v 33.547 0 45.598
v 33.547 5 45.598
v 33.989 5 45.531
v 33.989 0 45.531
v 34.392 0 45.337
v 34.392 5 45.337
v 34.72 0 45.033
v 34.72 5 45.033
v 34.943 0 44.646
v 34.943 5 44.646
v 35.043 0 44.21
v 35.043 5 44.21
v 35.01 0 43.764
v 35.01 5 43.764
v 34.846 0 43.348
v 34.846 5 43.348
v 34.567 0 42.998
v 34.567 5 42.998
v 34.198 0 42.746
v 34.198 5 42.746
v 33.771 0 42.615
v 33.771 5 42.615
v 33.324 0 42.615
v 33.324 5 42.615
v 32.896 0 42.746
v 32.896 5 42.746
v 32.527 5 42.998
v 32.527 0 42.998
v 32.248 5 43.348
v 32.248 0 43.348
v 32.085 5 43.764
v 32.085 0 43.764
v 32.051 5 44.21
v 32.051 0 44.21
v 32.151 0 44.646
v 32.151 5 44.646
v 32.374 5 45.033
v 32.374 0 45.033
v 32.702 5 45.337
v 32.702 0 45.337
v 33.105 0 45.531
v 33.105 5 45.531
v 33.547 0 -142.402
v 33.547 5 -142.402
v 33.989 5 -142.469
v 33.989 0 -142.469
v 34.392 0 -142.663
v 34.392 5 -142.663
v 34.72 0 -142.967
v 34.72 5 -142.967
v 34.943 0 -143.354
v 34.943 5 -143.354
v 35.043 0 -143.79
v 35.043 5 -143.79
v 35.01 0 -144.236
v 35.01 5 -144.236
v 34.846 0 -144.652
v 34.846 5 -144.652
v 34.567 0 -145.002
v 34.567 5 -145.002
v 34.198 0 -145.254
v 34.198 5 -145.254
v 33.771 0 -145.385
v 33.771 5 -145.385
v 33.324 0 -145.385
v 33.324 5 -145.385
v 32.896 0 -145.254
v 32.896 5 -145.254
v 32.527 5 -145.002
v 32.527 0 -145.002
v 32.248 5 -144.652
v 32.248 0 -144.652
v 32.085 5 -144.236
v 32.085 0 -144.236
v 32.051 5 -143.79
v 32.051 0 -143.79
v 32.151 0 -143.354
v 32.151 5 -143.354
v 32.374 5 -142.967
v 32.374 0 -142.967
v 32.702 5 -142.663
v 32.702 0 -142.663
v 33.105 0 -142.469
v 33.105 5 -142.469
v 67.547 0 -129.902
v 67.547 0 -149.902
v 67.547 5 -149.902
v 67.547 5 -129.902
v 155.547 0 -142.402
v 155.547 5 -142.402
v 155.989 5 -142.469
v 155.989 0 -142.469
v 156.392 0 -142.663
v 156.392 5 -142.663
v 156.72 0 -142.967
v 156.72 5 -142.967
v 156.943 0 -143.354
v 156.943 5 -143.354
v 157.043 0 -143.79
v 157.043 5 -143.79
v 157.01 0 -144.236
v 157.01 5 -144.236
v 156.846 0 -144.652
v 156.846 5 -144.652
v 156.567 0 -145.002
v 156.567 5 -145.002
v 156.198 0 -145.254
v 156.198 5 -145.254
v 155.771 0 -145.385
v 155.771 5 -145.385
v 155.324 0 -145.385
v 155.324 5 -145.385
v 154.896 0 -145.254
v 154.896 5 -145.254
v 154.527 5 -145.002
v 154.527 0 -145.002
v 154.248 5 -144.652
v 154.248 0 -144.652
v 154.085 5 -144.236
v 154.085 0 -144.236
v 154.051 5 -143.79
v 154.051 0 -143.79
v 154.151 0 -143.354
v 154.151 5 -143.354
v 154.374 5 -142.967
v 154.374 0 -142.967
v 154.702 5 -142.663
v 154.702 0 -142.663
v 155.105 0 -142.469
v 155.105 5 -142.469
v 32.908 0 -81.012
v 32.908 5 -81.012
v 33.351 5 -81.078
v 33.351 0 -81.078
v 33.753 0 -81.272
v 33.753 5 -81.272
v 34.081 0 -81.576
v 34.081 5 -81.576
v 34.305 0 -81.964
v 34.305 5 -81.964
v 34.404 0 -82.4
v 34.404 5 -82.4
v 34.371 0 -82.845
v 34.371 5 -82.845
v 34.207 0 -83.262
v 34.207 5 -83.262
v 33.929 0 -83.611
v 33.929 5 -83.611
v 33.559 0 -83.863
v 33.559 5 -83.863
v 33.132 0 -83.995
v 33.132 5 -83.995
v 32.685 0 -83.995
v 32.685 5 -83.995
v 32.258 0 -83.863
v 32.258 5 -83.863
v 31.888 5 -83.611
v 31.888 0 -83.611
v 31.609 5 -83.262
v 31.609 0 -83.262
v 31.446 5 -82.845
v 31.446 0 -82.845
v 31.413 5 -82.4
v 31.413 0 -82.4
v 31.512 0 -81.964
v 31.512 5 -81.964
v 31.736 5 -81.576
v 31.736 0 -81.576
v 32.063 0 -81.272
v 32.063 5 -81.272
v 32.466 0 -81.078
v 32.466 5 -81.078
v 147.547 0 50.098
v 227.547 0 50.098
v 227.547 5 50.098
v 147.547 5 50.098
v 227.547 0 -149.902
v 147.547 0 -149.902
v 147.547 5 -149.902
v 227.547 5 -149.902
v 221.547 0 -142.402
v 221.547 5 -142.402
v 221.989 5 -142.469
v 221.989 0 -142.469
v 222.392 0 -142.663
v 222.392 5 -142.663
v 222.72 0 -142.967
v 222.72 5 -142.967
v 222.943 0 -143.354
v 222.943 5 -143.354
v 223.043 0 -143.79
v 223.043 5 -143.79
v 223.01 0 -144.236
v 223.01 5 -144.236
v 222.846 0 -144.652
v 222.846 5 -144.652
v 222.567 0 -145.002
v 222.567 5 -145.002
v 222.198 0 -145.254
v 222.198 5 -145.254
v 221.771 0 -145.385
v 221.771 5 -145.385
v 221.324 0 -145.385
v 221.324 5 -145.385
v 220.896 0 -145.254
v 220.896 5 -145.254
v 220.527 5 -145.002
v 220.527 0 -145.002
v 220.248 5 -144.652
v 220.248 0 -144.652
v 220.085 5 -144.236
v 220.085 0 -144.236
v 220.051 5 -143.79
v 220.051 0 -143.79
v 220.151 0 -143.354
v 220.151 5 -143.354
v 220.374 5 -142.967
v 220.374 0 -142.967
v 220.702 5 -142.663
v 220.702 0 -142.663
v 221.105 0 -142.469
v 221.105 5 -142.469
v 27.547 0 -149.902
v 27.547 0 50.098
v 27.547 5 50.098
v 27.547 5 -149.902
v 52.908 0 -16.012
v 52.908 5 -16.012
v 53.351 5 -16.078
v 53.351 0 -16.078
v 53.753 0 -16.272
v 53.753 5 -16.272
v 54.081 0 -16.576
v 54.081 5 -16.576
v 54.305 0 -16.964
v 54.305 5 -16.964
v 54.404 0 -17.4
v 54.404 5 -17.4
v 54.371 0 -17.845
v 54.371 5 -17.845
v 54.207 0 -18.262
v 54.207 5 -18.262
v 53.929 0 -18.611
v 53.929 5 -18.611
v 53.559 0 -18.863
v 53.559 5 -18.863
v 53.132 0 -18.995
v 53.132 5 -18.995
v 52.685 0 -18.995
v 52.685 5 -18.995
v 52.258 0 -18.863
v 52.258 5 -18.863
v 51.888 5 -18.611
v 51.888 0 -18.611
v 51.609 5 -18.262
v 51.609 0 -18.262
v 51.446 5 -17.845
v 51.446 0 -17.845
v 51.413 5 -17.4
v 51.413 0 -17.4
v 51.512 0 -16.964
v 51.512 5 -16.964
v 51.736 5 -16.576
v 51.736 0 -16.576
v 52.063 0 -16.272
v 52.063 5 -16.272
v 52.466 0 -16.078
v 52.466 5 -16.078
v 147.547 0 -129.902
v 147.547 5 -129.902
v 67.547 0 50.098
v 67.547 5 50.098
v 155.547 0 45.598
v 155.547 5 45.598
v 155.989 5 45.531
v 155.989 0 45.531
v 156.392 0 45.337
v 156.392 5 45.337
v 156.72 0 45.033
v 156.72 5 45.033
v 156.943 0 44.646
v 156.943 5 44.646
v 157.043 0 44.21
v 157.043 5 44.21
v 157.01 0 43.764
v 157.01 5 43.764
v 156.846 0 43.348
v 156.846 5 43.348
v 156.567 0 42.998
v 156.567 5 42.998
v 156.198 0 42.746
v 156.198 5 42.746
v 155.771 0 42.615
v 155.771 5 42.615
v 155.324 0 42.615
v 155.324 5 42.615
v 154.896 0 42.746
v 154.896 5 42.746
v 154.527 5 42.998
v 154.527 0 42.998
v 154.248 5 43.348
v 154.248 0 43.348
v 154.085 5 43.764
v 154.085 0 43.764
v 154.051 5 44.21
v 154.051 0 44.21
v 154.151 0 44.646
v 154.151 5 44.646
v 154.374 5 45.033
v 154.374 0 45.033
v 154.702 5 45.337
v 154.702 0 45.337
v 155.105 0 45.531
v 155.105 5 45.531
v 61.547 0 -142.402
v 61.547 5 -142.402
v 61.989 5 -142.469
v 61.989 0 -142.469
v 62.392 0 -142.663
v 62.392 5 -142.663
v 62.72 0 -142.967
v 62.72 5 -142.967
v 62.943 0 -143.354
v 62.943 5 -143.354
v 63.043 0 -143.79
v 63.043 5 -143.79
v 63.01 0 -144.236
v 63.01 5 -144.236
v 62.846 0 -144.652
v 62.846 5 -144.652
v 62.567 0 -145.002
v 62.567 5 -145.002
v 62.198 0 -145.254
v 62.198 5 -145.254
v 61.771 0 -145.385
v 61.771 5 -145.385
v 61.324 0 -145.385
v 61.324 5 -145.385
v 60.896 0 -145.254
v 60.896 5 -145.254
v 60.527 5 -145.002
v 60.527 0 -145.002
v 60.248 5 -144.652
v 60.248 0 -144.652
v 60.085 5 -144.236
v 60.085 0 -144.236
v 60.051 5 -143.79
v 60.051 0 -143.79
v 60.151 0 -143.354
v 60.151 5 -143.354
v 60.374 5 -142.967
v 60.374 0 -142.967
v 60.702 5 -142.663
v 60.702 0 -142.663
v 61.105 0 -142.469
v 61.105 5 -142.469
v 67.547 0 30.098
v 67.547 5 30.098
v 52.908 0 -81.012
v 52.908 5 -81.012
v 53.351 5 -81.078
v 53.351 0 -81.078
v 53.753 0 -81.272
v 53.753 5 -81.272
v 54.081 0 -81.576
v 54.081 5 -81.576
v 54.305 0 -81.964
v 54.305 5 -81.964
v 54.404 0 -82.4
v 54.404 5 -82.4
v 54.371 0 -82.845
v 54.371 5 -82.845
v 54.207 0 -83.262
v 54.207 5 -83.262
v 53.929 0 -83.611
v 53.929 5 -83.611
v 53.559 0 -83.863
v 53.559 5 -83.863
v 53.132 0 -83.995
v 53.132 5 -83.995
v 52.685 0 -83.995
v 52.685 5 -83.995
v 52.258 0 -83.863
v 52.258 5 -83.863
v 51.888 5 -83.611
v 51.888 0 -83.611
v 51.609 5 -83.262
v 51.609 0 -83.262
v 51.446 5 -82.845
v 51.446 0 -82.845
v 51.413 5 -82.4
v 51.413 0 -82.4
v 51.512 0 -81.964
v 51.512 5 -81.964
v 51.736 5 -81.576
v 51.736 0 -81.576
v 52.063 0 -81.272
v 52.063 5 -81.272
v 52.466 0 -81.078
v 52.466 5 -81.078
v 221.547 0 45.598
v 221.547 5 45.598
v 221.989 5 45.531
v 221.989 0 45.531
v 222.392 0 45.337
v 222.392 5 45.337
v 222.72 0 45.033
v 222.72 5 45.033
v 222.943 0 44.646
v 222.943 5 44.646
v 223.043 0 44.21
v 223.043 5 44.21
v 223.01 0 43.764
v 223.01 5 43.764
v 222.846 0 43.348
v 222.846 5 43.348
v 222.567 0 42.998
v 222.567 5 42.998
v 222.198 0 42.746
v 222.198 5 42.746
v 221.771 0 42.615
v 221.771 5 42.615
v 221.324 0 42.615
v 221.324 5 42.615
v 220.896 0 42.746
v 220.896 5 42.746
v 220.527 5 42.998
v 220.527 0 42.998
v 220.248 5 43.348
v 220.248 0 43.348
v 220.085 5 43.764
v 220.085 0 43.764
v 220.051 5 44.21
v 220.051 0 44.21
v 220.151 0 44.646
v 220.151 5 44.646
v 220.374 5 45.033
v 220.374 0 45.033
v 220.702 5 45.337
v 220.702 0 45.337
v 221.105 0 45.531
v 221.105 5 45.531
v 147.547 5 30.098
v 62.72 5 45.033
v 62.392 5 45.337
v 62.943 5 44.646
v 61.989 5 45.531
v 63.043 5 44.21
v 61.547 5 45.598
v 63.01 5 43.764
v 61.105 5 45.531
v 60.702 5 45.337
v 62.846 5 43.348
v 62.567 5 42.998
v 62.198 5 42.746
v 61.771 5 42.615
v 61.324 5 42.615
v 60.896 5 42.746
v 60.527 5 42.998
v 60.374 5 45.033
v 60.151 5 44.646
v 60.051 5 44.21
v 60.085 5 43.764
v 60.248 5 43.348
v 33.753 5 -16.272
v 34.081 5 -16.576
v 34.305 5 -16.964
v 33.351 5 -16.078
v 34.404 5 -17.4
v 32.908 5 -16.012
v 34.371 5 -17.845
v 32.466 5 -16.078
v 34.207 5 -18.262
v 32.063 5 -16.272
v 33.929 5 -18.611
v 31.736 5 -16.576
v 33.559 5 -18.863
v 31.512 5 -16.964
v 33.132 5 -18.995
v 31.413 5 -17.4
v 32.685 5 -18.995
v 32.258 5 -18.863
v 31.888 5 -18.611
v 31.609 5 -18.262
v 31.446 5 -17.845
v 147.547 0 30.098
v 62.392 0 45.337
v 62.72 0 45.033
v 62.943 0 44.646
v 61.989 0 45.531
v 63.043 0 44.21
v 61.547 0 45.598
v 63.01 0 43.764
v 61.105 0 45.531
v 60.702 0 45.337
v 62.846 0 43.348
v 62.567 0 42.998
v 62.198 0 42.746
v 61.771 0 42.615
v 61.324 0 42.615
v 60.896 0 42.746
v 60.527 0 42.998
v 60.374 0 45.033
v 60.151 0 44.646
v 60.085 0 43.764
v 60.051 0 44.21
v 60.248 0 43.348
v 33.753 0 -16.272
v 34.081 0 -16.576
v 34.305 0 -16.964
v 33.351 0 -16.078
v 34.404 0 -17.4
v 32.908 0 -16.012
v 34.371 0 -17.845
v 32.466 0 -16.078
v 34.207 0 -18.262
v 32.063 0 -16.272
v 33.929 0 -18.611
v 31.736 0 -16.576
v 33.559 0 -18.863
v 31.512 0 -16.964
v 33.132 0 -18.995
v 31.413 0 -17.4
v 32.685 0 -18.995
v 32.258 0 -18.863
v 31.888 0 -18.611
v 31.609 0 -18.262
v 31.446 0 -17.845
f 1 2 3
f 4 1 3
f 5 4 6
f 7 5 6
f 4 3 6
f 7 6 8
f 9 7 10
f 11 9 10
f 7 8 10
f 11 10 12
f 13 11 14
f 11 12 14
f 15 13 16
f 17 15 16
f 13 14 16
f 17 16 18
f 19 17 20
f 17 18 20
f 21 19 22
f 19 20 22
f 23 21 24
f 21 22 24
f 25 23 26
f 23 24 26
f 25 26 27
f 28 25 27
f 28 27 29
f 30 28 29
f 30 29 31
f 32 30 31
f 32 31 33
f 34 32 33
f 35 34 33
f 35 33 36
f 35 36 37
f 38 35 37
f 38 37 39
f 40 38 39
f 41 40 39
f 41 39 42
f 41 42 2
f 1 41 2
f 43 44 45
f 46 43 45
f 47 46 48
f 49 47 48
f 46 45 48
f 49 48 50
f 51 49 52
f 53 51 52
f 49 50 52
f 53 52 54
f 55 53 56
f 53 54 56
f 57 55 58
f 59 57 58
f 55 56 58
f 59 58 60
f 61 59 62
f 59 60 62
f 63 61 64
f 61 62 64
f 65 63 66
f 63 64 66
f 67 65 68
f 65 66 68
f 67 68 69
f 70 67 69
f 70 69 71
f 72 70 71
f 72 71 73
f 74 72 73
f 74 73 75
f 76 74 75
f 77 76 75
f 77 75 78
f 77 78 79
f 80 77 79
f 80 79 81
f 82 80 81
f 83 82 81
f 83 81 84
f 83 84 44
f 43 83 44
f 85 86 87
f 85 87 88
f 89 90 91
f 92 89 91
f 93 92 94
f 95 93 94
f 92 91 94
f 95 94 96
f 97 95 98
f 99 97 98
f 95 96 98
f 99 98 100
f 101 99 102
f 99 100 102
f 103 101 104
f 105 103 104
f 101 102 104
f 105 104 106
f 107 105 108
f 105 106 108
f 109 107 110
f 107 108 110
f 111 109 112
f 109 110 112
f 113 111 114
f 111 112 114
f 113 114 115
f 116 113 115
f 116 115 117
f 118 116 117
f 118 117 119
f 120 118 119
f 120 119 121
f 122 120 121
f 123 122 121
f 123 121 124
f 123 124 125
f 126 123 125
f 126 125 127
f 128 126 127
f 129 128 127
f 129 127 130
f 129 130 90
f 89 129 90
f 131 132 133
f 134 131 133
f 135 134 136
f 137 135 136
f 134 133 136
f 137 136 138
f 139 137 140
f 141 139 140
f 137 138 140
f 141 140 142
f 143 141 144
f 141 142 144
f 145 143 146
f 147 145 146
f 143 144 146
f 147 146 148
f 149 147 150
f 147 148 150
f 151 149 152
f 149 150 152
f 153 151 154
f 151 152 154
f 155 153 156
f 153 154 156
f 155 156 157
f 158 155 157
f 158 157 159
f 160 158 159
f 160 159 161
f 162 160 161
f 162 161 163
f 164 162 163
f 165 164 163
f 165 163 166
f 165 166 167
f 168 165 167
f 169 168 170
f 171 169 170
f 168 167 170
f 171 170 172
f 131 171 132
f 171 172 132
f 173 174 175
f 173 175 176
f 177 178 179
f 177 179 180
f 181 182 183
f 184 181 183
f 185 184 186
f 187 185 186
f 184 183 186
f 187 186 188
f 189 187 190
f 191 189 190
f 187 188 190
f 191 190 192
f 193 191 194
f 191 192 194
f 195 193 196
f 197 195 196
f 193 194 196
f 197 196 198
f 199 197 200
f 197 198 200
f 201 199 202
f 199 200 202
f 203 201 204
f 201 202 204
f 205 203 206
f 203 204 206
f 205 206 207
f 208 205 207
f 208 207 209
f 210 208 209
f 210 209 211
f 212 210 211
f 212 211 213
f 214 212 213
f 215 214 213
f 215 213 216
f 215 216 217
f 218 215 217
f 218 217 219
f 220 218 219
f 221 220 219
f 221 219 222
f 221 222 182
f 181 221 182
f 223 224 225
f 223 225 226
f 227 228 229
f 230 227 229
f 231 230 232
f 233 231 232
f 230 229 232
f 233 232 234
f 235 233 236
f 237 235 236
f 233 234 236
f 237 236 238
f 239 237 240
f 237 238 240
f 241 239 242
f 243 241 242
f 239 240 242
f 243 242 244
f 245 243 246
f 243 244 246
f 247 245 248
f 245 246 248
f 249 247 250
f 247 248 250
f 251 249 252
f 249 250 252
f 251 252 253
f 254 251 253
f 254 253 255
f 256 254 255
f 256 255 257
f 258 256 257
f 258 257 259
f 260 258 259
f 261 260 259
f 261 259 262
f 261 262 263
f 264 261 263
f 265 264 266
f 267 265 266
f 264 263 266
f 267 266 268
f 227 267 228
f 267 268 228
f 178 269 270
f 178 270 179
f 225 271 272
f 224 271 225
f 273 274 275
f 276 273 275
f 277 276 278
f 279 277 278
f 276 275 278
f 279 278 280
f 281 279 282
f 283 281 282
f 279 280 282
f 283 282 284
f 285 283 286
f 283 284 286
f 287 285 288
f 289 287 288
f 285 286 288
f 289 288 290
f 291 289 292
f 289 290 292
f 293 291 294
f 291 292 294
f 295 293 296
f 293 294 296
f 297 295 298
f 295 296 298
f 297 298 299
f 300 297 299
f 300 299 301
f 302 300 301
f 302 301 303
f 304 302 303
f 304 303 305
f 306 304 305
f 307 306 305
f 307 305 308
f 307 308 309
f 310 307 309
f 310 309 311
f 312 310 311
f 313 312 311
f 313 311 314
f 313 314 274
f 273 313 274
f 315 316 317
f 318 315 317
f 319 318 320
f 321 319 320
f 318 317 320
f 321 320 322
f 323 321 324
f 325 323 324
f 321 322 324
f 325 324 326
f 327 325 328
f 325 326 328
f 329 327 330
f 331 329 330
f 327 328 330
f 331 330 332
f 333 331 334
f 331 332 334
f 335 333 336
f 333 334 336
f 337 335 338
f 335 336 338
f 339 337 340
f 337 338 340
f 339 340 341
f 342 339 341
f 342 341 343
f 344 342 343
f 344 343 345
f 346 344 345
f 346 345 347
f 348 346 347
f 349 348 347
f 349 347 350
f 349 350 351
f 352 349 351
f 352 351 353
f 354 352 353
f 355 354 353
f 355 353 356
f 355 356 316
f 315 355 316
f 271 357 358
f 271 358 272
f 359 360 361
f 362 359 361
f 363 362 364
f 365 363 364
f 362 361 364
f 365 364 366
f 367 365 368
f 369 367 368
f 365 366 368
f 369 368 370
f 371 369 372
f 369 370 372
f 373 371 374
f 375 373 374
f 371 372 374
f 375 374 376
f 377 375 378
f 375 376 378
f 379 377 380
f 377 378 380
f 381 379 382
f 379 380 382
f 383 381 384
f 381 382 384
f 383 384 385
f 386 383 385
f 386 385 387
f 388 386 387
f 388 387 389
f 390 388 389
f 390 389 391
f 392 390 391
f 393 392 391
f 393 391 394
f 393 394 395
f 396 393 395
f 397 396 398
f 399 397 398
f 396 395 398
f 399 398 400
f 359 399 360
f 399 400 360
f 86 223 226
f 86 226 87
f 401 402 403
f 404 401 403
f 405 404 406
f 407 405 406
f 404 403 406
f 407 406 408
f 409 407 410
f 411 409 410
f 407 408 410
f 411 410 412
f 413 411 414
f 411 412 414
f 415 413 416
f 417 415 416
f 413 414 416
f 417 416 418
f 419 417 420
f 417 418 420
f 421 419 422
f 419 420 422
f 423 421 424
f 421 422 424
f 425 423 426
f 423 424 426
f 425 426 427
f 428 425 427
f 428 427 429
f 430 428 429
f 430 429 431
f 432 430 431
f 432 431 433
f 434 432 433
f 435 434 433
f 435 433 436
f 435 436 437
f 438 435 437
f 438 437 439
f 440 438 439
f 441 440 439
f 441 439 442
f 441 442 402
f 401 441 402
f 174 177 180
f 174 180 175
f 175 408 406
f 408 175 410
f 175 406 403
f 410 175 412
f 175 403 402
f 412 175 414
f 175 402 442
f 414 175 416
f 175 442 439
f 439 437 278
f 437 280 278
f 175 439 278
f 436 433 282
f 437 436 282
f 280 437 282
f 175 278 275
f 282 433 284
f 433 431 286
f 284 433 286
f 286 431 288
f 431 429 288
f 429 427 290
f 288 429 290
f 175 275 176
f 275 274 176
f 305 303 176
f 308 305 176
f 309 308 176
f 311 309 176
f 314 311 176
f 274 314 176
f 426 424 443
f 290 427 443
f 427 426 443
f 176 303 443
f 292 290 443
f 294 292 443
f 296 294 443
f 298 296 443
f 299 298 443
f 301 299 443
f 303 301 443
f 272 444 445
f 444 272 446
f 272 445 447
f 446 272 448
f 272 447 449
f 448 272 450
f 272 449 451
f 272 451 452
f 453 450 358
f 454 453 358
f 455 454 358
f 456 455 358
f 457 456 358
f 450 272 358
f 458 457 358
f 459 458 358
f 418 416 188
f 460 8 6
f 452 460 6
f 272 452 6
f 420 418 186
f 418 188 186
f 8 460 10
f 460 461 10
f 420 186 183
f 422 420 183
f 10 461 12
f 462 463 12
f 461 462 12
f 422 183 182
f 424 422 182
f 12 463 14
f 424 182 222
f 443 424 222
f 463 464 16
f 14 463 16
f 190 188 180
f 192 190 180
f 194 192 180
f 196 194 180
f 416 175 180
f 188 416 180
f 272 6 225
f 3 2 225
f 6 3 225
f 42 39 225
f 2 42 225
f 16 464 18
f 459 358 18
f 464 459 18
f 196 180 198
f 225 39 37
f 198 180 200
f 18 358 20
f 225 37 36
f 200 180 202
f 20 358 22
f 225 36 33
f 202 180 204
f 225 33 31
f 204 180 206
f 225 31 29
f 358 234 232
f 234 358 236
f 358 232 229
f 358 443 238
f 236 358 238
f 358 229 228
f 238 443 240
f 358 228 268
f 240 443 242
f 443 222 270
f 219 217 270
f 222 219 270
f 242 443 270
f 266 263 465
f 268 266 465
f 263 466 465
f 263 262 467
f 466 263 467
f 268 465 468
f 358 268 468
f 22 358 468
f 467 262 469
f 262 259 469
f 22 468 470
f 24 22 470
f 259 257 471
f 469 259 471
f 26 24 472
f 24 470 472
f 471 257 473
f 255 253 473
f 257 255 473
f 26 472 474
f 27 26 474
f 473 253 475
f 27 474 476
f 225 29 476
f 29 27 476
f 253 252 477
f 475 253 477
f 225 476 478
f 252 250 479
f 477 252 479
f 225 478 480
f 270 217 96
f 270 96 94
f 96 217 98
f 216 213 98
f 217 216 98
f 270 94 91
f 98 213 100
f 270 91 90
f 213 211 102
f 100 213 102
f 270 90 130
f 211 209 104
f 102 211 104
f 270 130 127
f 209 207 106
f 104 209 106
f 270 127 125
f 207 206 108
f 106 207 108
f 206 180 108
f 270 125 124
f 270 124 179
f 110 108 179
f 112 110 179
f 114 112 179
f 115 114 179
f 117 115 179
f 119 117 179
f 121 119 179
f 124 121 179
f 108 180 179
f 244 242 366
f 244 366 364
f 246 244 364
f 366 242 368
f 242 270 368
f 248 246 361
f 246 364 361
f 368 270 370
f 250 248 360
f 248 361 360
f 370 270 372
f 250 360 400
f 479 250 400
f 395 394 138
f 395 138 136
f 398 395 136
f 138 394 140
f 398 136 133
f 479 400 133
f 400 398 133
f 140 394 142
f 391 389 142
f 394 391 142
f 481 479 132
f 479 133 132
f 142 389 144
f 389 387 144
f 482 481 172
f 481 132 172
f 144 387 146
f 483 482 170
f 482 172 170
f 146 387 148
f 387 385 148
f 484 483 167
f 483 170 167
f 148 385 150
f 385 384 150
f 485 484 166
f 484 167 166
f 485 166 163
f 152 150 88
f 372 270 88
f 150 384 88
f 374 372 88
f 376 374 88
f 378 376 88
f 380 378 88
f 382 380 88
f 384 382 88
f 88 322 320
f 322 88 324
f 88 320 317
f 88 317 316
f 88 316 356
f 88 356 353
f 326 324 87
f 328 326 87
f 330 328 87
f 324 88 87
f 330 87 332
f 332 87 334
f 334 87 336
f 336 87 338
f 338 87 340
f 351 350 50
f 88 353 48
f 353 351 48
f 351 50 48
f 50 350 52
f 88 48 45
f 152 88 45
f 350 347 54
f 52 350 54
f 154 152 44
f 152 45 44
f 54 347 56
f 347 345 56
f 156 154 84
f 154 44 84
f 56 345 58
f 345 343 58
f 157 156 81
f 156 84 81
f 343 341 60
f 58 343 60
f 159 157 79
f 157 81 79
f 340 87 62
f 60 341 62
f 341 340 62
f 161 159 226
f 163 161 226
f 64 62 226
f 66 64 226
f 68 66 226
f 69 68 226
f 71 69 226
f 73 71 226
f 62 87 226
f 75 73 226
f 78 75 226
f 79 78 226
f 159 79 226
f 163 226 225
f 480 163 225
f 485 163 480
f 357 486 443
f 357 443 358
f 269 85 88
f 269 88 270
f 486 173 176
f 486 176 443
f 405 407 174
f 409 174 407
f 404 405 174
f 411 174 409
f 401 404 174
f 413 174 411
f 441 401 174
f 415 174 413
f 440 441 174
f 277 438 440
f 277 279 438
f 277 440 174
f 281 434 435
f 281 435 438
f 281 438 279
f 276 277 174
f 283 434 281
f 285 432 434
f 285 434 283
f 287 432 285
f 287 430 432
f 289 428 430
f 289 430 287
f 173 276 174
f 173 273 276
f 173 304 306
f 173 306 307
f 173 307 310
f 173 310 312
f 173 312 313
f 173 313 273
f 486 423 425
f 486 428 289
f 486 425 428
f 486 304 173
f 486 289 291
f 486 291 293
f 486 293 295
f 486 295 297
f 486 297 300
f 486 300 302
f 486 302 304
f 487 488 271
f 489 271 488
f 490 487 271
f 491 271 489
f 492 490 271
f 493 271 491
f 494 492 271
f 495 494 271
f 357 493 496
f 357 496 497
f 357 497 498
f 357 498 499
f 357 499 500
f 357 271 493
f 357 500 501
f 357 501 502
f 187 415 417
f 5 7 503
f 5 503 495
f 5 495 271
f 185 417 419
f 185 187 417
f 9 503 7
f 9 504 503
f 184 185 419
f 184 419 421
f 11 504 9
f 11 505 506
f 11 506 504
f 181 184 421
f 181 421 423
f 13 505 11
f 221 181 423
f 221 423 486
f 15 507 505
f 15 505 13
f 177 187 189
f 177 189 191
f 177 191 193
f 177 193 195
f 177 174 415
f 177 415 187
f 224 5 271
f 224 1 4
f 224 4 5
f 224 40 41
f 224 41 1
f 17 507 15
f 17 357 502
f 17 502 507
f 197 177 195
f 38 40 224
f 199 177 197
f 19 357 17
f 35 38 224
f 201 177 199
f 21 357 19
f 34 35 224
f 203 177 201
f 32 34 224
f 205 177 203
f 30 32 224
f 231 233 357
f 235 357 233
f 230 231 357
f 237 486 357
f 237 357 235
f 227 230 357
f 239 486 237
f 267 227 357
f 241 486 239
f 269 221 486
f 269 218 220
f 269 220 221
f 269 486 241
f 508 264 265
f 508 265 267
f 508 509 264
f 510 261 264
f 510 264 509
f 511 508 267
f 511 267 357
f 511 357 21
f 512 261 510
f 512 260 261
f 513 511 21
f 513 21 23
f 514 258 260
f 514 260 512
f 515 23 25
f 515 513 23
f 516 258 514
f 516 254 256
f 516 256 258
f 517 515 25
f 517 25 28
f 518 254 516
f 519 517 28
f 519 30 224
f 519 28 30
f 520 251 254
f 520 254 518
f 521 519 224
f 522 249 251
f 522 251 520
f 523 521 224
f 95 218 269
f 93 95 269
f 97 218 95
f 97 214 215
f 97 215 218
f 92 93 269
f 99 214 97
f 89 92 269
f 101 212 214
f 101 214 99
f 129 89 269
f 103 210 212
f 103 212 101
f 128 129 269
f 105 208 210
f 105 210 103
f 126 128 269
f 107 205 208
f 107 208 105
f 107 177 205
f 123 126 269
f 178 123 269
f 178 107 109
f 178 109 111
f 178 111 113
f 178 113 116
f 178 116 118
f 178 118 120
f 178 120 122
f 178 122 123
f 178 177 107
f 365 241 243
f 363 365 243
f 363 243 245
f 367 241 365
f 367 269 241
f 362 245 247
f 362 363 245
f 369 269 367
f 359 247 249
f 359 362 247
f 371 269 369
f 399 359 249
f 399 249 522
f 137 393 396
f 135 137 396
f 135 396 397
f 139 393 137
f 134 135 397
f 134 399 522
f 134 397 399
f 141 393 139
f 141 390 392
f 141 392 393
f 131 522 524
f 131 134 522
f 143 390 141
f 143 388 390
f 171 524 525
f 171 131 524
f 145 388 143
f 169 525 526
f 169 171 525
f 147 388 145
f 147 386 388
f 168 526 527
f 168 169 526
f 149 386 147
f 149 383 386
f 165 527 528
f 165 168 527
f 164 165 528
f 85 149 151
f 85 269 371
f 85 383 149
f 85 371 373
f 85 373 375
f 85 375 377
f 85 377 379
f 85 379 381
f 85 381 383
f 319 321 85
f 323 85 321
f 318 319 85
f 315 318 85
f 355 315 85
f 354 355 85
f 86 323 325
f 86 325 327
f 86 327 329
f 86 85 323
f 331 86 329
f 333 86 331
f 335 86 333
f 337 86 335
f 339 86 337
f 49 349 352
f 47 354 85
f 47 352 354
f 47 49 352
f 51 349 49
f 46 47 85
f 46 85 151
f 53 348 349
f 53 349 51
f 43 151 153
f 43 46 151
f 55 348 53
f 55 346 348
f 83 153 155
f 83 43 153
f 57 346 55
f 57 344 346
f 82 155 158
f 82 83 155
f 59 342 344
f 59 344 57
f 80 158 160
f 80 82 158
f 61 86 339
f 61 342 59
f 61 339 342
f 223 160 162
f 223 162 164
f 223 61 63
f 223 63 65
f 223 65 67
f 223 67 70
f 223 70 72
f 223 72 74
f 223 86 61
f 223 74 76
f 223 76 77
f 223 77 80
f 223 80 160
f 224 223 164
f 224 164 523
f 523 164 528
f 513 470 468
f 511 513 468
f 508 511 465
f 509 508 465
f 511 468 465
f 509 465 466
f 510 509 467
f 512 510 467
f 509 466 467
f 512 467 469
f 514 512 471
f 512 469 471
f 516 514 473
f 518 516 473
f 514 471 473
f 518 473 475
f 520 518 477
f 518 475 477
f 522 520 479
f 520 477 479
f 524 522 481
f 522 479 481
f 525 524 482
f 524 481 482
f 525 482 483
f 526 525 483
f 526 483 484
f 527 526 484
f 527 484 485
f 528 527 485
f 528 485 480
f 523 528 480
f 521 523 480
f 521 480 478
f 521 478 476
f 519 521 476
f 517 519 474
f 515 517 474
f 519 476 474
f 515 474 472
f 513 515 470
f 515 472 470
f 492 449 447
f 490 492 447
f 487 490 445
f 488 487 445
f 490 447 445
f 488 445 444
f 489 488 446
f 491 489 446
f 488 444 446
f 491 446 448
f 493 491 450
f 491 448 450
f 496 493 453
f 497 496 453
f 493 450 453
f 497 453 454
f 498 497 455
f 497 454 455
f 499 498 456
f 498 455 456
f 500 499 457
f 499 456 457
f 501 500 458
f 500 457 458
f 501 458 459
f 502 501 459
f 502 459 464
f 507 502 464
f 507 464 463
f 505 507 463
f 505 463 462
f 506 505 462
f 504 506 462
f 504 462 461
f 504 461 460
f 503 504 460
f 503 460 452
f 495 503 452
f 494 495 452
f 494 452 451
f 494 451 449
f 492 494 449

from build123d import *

# Parameters (mm, degrees)
BOSS_EXTRUDE1_DEPTH = 5
SKETCH2_R           = 1.5
CUT_EXTRUDE1_DEPTH  = 20
SKETCH3_R           = 1.5
CUT_EXTRUDE2_DEPTH  = 5


with BuildPart() as part:
    # Sketch1 → Boss-Extrude1 (new body)
    with BuildSketch(Plane(origin=(0, 0, 0), x_dir=(1, 0, 0), z_dir=(0, 1, 0))):
        Polygon((67.547169811, 149.902137597), (67.547169811, 129.902137597), (147.547169811, 129.902137597), (147.547169811, 149.902137597), (227.547169811, 149.902137597), (227.547169811, -50.097862403), (147.547169811, -50.097862403), (147.547169811, -30.097862403), (67.547169811, -30.097862403), (67.547169811, -50.097862403), (27.547169811, -50.097862403), (27.547169811, 149.902137597), align=None)
    extrude(amount=BOSS_EXTRUDE1_DEPTH)

    # Sketch2 → Cut-Extrude1 (cut)
    with BuildSketch(Plane(origin=(0, 5, 0), x_dir=(1, 0, 0), z_dir=(0, 1, 0))):
        with Locations((33.547169811, 143.902137597)):
            Circle(SKETCH2_R)
        with Locations((61.547169811, 143.902137597)):
            Circle(SKETCH2_R)
        with Locations((33.547169811, -44.097862403)):
            Circle(SKETCH2_R)
        with Locations((61.547169811, -44.097862403)):
            Circle(SKETCH2_R)
        with Locations((155.547169811, -44.097862403)):
            Circle(SKETCH2_R)
        with Locations((221.547169811, -44.097862403)):
            Circle(SKETCH2_R)
        with Locations((155.547169811, 143.902137597)):
            Circle(SKETCH2_R)
        with Locations((221.547169811, 143.902137597)):
            Circle(SKETCH2_R)
    extrude(amount=-CUT_EXTRUDE1_DEPTH, mode=Mode.SUBTRACT)

    # Sketch3 → Cut-Extrude2 (cut)
    with BuildSketch(Plane(origin=(0, 5, 0), x_dir=(1, 0, 0), z_dir=(0, 1, 0))):
        with Locations((32.908431657, 82.511625863)):
            Circle(SKETCH3_R)
        with Locations((32.908431657, 17.511625863)):
            Circle(SKETCH3_R)
        with Locations((52.908431657, 17.511625863)):
            Circle(SKETCH3_R)
        with Locations((52.908431657, 82.511625863)):
            Circle(SKETCH3_R)
    extrude(amount=-CUT_EXTRUDE2_DEPTH, mode=Mode.SUBTRACT)


solid = part.part
